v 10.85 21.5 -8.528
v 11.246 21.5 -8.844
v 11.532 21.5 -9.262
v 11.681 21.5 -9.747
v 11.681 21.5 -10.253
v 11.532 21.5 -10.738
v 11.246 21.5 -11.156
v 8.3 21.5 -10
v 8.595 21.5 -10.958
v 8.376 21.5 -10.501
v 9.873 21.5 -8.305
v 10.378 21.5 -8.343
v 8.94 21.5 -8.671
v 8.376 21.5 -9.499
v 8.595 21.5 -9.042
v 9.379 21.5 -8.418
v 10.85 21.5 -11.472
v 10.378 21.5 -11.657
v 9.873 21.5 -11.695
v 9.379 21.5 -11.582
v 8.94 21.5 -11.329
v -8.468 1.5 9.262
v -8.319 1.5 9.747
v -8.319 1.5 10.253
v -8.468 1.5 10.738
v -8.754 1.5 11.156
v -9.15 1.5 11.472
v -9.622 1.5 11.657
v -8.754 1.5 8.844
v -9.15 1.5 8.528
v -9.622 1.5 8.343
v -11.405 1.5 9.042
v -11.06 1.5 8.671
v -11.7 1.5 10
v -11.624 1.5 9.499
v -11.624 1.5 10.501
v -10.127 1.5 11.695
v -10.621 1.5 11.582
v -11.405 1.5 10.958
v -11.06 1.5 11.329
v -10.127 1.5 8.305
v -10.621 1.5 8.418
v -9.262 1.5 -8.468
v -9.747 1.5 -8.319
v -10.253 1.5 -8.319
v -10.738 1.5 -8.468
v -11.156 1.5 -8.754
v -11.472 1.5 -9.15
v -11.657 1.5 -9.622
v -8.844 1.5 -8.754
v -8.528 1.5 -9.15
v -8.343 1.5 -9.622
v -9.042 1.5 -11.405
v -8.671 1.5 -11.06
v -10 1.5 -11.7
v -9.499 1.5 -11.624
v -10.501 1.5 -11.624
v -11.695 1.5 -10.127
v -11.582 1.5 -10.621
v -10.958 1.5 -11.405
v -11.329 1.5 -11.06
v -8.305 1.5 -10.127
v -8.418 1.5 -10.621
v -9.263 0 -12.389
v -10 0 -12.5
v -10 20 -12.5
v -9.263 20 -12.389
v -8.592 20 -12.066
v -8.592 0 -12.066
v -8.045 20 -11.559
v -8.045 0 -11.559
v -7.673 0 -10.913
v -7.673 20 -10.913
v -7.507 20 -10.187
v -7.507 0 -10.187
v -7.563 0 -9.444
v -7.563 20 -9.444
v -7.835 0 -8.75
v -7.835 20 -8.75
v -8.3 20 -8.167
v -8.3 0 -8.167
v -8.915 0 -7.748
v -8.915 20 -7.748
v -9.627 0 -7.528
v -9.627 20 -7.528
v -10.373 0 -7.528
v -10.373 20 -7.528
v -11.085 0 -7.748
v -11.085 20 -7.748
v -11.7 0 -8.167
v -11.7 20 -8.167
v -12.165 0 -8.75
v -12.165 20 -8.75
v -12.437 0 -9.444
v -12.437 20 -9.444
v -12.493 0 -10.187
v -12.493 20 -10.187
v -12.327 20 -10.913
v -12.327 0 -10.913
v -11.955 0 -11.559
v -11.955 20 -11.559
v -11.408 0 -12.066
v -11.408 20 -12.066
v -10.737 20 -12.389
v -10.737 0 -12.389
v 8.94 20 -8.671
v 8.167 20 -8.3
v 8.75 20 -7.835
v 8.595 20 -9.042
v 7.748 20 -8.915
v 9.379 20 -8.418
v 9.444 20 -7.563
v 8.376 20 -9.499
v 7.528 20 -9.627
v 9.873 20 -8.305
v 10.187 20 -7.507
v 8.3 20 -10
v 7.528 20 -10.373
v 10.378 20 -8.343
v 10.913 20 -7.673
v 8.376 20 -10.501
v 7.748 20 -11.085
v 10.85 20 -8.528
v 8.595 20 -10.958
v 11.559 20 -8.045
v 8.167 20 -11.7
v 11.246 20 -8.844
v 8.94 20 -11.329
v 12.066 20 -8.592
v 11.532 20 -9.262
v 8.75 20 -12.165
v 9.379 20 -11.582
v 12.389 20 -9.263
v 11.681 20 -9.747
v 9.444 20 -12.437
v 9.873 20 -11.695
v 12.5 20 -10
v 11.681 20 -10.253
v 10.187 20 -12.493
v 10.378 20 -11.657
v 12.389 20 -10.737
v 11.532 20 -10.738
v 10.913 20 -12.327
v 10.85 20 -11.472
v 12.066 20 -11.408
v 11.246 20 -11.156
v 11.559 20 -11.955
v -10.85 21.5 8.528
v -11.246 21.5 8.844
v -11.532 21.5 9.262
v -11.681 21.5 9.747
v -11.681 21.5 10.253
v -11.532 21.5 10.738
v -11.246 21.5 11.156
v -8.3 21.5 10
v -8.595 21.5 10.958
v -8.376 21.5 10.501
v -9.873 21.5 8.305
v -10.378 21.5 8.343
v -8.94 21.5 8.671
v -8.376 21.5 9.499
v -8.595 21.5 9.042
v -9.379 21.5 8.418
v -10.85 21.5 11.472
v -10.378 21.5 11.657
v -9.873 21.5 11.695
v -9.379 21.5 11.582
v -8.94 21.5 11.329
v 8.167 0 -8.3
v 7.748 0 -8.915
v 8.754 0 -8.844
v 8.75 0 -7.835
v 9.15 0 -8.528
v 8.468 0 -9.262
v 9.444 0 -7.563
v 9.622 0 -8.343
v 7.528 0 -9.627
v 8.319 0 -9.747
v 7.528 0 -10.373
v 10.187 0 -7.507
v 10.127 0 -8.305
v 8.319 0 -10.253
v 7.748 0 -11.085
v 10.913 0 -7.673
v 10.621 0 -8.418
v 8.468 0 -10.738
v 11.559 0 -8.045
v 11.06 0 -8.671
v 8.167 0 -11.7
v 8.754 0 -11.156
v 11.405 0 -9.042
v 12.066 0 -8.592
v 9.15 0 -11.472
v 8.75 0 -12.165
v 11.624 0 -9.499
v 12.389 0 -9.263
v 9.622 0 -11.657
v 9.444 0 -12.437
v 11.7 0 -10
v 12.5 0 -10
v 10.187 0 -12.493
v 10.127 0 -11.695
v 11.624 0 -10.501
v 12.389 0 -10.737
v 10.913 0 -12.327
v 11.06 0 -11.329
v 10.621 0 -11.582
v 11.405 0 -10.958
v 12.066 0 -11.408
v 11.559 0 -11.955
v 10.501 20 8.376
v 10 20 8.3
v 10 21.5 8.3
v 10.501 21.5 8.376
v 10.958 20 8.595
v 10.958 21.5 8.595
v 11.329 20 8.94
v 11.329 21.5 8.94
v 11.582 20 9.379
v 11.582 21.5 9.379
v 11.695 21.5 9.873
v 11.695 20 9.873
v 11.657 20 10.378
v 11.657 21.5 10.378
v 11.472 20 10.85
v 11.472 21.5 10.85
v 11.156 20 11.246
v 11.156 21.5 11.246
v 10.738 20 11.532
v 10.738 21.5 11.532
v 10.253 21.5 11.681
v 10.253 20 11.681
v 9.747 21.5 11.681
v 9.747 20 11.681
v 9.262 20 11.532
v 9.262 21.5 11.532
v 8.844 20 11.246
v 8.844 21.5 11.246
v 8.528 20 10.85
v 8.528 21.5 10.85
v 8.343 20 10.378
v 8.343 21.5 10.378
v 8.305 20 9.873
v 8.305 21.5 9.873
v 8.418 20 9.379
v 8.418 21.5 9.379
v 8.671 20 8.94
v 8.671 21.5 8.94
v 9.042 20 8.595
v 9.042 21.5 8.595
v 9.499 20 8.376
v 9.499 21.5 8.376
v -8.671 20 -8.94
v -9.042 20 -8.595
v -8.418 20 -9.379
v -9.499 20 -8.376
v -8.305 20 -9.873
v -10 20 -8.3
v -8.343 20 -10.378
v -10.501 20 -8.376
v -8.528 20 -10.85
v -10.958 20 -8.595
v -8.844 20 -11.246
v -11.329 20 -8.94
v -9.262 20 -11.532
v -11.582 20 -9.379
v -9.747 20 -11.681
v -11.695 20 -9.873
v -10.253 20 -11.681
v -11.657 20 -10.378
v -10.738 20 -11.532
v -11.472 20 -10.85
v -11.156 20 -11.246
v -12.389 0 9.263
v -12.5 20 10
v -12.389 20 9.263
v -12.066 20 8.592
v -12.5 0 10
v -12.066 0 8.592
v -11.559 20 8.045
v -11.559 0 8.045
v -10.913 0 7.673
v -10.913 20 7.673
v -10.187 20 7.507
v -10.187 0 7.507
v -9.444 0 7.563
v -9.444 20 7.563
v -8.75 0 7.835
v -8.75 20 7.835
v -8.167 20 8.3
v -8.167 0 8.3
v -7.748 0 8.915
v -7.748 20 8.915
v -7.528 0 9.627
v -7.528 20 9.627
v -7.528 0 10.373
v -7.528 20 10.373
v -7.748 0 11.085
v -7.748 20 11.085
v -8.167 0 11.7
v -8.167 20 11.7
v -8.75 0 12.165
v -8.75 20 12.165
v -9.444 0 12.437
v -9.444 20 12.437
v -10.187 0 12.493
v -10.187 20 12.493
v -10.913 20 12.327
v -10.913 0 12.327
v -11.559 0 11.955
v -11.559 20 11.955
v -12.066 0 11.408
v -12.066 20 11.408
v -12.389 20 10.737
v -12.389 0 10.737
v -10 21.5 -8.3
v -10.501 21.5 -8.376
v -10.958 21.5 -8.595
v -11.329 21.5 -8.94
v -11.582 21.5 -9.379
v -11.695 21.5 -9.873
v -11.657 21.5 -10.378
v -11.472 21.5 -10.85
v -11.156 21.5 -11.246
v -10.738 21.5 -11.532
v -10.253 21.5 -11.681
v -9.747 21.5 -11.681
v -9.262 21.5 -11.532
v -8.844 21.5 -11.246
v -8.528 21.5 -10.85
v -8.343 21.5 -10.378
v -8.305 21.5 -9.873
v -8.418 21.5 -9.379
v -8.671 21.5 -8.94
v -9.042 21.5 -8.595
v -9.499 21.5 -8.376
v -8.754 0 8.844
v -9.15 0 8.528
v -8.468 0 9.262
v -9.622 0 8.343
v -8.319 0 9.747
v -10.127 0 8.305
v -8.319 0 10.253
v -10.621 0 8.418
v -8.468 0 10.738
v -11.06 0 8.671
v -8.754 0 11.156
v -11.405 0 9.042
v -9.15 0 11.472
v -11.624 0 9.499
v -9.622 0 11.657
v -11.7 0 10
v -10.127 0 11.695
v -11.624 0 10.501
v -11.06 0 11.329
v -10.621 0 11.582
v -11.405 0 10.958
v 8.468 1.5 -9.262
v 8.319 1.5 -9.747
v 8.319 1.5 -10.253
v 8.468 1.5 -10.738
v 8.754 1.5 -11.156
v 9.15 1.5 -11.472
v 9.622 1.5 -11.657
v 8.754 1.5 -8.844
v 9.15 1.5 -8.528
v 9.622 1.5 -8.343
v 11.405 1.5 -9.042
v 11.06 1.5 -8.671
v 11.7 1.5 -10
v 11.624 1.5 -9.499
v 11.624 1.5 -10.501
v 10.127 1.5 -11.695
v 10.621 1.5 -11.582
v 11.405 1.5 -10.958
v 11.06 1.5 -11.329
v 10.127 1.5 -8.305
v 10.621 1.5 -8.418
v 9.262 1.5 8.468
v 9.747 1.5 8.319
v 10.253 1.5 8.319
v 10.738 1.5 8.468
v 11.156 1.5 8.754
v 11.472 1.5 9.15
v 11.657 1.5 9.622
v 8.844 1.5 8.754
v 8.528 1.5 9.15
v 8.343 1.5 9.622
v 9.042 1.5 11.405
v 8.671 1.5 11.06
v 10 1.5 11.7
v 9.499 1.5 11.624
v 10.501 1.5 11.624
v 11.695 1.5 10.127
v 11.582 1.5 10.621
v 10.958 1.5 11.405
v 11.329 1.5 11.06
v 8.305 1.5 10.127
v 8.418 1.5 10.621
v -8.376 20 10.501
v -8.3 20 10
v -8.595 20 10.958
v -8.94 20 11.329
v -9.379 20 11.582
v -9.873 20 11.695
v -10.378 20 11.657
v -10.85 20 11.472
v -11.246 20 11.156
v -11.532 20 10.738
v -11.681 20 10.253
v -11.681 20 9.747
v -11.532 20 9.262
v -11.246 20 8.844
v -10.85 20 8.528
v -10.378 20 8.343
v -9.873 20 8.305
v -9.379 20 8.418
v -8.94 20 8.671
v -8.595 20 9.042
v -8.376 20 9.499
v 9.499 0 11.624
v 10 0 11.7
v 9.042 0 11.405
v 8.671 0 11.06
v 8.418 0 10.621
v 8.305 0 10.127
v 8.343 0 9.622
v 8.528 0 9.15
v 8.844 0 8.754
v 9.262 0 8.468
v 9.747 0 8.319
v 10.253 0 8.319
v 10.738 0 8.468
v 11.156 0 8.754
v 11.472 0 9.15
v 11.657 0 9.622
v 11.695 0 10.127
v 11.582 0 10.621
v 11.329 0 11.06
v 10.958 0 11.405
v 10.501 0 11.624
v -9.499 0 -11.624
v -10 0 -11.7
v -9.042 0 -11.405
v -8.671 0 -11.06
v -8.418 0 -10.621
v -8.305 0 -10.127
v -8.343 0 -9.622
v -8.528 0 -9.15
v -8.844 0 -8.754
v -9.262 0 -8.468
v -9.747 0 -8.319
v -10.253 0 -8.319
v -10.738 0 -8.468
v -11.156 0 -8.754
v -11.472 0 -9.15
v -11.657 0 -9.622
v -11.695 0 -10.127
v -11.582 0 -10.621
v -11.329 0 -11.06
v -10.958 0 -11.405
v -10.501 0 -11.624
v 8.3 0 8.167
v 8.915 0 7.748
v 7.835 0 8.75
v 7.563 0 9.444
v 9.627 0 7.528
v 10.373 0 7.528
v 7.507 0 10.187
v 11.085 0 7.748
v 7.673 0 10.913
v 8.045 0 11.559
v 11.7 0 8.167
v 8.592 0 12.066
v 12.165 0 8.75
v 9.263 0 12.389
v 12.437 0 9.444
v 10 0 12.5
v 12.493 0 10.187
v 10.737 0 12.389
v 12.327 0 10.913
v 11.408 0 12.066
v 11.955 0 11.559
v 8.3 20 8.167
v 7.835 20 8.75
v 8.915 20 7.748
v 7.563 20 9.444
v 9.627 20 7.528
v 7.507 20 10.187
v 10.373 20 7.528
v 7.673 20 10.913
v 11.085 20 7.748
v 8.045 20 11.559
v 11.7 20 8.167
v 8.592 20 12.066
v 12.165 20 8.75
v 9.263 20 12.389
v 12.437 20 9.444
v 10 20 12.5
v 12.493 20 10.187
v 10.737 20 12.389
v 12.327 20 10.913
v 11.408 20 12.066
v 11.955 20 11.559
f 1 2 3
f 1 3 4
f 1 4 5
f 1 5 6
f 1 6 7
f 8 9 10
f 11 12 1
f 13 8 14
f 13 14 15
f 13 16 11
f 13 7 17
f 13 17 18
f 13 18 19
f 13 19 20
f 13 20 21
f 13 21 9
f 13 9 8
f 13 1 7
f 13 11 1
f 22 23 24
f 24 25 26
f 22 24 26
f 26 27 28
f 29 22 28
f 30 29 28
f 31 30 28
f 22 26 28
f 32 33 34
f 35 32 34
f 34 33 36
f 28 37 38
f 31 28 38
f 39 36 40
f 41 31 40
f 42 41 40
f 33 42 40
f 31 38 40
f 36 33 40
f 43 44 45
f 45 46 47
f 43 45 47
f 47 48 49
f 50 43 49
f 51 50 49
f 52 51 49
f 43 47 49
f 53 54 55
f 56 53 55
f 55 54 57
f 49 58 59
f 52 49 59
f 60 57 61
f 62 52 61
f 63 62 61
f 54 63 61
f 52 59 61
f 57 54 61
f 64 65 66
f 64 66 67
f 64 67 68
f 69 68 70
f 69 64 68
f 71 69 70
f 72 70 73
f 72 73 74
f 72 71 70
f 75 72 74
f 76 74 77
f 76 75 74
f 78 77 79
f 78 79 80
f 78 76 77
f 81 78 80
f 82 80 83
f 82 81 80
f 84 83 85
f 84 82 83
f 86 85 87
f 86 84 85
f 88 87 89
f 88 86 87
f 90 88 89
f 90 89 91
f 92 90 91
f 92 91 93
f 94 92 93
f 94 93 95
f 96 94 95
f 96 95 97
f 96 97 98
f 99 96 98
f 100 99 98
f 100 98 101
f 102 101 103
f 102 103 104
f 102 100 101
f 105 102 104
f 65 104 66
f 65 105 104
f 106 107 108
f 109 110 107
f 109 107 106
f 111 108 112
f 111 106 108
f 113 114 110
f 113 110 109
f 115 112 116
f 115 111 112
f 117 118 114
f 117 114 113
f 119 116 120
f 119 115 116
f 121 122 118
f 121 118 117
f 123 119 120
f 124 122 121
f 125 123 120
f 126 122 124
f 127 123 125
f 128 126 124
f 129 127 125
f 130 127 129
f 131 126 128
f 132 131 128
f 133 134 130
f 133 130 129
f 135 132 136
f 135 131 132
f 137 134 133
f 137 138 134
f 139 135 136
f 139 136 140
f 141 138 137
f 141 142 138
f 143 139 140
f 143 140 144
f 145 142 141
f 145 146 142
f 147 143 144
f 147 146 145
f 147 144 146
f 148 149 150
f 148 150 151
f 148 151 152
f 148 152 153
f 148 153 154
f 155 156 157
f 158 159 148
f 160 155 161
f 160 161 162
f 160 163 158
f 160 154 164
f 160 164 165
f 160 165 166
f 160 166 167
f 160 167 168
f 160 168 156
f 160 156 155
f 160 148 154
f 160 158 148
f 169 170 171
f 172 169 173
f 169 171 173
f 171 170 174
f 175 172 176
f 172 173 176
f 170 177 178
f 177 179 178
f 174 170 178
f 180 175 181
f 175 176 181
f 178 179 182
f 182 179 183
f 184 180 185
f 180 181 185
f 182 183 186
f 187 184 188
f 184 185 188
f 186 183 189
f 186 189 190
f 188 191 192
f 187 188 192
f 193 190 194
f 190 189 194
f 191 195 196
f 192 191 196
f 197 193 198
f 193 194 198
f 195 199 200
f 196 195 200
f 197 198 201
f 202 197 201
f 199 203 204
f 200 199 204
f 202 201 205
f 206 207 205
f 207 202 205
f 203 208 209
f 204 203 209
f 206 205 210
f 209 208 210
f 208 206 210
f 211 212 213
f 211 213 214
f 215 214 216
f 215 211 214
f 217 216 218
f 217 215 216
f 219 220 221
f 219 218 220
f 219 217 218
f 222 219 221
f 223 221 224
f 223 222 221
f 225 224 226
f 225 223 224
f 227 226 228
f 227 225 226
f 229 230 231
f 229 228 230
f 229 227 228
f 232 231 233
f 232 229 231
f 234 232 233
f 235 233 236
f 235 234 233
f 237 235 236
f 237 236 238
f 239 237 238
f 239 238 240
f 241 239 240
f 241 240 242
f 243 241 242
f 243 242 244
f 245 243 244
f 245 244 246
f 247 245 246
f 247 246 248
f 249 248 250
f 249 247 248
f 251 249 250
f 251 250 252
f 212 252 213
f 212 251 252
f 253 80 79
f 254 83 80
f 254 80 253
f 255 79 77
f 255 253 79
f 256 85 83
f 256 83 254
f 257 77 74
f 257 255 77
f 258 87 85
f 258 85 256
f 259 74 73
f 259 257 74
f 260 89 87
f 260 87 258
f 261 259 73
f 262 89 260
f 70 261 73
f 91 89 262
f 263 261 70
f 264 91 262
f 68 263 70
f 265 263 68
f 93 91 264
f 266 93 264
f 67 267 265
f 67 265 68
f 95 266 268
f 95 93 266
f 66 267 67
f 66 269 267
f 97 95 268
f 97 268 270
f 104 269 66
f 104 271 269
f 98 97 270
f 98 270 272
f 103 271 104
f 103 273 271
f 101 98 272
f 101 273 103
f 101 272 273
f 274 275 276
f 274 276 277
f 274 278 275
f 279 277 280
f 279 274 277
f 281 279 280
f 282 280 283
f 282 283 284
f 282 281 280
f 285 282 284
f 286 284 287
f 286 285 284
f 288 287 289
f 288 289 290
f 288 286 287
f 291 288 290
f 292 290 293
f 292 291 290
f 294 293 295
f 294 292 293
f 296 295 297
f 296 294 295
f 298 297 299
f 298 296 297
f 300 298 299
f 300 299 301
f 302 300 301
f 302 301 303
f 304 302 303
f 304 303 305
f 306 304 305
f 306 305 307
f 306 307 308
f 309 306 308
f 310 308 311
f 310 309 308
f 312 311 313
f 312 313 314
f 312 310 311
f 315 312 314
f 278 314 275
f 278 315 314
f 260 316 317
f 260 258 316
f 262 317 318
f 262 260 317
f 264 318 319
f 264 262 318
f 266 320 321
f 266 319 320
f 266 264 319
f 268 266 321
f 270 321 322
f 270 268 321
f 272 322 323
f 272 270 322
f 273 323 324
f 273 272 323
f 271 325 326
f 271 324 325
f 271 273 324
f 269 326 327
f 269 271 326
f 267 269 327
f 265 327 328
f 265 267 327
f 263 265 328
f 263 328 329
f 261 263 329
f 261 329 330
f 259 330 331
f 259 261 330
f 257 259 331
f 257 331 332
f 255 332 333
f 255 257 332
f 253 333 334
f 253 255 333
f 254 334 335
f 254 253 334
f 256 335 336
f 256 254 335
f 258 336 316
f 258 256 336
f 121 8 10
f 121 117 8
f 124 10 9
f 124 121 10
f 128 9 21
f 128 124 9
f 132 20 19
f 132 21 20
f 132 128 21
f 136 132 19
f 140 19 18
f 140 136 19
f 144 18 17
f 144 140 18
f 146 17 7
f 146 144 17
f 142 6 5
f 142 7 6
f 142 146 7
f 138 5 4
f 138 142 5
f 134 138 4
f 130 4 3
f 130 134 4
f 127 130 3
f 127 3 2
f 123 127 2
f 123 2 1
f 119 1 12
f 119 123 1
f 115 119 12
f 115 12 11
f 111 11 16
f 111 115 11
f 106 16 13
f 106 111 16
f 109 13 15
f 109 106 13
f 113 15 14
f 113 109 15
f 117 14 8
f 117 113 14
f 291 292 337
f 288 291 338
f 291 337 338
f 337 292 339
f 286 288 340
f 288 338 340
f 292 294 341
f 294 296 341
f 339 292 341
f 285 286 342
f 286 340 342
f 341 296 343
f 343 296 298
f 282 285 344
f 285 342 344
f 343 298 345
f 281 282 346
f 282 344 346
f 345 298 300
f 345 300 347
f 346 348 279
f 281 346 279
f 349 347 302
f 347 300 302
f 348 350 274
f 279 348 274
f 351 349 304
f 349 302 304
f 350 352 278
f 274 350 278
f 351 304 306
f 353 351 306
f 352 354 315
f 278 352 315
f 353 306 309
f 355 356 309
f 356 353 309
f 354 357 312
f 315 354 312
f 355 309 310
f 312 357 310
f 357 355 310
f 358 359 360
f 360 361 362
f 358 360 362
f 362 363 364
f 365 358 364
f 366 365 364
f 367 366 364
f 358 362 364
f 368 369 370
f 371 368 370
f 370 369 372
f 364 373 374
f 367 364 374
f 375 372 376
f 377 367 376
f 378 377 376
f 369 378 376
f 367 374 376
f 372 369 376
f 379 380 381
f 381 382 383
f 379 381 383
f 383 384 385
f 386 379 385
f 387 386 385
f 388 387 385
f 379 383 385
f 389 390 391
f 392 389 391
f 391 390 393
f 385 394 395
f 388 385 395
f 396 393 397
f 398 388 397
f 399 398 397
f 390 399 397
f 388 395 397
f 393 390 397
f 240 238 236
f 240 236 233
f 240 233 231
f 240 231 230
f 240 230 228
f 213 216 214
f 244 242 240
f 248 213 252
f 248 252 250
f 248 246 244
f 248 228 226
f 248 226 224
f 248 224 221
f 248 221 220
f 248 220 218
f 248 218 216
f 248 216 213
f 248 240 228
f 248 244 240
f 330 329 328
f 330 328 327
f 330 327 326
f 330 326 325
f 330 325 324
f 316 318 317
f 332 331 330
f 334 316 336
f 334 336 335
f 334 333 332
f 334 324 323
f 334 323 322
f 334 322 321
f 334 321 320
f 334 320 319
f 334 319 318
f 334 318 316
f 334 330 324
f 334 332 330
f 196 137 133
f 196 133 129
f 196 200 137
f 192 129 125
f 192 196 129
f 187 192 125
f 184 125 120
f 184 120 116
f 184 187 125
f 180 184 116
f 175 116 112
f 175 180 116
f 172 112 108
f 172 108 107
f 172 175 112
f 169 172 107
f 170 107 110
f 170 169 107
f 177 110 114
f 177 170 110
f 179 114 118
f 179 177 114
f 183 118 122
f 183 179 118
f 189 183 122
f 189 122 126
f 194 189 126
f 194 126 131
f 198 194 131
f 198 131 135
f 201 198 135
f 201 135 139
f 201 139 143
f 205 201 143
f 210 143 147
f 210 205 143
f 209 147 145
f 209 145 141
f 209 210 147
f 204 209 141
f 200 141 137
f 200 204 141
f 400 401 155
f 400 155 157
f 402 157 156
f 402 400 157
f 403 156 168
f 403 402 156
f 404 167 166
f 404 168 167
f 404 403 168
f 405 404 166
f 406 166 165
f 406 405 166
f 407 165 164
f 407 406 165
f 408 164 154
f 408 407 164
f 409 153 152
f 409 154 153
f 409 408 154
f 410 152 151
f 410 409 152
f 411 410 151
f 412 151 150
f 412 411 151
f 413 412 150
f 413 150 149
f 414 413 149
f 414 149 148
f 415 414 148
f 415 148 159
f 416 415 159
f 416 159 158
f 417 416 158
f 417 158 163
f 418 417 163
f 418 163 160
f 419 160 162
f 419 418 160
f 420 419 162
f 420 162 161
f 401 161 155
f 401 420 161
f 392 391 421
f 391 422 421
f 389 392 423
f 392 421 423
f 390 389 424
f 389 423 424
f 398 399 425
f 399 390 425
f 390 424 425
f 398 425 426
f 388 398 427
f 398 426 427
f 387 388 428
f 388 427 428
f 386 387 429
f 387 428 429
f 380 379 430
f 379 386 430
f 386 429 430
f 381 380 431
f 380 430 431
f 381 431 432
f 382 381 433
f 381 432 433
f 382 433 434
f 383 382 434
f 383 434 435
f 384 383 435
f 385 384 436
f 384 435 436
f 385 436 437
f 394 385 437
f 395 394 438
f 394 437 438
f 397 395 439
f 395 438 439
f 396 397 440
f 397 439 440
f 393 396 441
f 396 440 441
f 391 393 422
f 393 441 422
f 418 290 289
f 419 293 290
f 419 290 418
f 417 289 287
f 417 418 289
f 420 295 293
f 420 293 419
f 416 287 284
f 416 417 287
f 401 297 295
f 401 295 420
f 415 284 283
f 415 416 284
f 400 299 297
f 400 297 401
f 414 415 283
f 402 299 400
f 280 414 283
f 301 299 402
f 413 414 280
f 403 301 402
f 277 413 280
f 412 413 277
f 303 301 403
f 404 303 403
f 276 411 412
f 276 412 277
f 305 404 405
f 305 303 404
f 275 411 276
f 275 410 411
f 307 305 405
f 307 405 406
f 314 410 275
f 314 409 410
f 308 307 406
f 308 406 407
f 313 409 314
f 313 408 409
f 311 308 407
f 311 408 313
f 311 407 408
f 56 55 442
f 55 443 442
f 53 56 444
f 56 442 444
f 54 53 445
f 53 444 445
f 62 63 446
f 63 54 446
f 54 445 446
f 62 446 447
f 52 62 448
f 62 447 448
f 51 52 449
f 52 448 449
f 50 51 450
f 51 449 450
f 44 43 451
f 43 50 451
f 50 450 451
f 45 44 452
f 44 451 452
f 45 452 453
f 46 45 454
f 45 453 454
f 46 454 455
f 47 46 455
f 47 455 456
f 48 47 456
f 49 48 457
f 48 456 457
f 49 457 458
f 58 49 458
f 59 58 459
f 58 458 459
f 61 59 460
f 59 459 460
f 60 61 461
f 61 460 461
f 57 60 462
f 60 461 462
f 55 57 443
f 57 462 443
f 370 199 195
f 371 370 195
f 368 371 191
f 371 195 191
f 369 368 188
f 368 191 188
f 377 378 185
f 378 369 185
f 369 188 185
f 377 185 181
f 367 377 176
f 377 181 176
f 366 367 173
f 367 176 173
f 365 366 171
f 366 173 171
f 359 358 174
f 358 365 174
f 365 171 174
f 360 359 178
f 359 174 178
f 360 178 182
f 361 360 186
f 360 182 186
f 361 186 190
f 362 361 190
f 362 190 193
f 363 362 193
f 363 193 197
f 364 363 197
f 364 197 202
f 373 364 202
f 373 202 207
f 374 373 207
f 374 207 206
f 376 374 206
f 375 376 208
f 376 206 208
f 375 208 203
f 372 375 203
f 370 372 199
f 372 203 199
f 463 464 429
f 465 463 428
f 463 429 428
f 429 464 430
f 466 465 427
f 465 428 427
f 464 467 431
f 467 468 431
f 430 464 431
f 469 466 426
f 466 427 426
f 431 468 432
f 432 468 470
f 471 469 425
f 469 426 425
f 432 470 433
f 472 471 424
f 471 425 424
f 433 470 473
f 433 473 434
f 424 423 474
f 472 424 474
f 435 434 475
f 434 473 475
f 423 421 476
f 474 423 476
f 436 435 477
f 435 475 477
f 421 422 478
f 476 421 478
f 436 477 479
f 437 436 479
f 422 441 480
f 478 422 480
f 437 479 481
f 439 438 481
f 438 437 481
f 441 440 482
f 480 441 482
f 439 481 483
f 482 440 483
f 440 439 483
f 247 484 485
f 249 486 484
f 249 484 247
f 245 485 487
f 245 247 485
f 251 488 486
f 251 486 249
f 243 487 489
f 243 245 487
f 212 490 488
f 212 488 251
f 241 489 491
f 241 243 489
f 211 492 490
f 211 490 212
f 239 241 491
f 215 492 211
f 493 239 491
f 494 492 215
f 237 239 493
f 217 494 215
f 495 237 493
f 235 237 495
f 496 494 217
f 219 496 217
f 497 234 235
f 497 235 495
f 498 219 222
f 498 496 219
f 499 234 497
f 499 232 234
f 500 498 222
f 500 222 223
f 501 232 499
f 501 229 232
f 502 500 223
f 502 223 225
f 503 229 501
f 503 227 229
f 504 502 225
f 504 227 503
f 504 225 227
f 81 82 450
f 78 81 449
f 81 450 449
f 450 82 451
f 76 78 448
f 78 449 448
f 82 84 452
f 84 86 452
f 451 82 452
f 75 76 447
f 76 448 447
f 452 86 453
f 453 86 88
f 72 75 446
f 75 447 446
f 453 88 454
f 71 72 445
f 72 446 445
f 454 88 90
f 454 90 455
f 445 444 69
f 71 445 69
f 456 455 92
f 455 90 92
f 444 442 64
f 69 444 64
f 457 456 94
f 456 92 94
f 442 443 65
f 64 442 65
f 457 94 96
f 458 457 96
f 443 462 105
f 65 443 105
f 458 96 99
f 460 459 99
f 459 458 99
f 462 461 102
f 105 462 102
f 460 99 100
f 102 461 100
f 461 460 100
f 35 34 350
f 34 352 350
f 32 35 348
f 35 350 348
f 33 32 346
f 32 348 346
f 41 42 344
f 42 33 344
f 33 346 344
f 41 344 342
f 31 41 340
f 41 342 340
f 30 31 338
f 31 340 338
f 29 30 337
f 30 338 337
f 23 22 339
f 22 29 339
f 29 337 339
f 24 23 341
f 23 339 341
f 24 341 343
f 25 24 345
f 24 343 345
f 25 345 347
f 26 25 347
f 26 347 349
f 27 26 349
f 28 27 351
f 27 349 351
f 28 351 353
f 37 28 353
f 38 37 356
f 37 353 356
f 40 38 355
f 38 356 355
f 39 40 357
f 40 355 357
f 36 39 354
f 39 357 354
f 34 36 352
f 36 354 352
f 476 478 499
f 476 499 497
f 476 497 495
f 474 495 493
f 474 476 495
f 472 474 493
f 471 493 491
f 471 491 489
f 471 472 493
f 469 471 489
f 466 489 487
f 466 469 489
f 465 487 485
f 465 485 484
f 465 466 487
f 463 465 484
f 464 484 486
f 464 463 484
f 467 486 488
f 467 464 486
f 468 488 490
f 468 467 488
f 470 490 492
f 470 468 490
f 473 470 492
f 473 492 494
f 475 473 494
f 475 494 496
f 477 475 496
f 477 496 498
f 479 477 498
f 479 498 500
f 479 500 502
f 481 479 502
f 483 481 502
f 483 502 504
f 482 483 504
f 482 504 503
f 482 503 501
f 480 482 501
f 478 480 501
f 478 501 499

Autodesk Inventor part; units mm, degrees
ref_plane "YZ Plane" through (0, 0, 0) normal (1, 0, 0) x (0, 1, 0)
ref_plane "XZ Plane" through (0, 0, 0) normal (0, 1, 0) x (-1, 0, 0)
ref_plane "XY Plane" through (0, 0, 0) normal (0, 0, 1) x (1, 0, 0)
sketch "草圖1" plane through (0, 0, 0) normal (0, 1, 0) x (-1, 0, 0)
  circle A0 centre (10, 10) radius 1.7
  circle A1 centre (10, 10) radius 2.5
  line L0 (12.5, 12.5) -> (-12.5, 12.5)
  line L1 (-12.5, 12.5) -> (-12.5, -12.5)
  line L2 (-12.5, -12.5) -> (12.5, -12.5)
  line L3 (12.5, -12.5) -> (12.5, 12.5)
  point P0 (0, 0)
  point P1 (12.5, 0)
  point P2 (0, -12.5)
  dimension "d0" = 3.4
  dimension "d1" = 5
  dimension "d11" = 25
  dimension "d12" = 25
  dimension "d13" = 2.5
  dimension "d14" = 2.5
extrude "擠出1" add sketch "草圖1" along normal blind 20 contours A0 | A1
extrude "擠出2" cut sketch "草圖1" along normal blind 1.5 contours A0
sketch "草圖2" plane through (-10, 20, 10) normal (0, 1, 0) x (1, 0, 0)
  circle A0 centre (0, 0) radius 1.7 projected
  point P0 (10, 10)
extrude "擠出3" add sketch "草圖2" along normal blind 1.5
pattern_circular "環形陣列1" count 4 over 360 about axis through (0, -10, 0) along (0, 1, 0) of "擠出1", "擠出3", "擠出2"
properties part number "110033226_ipt_26_騎樓梁架"
